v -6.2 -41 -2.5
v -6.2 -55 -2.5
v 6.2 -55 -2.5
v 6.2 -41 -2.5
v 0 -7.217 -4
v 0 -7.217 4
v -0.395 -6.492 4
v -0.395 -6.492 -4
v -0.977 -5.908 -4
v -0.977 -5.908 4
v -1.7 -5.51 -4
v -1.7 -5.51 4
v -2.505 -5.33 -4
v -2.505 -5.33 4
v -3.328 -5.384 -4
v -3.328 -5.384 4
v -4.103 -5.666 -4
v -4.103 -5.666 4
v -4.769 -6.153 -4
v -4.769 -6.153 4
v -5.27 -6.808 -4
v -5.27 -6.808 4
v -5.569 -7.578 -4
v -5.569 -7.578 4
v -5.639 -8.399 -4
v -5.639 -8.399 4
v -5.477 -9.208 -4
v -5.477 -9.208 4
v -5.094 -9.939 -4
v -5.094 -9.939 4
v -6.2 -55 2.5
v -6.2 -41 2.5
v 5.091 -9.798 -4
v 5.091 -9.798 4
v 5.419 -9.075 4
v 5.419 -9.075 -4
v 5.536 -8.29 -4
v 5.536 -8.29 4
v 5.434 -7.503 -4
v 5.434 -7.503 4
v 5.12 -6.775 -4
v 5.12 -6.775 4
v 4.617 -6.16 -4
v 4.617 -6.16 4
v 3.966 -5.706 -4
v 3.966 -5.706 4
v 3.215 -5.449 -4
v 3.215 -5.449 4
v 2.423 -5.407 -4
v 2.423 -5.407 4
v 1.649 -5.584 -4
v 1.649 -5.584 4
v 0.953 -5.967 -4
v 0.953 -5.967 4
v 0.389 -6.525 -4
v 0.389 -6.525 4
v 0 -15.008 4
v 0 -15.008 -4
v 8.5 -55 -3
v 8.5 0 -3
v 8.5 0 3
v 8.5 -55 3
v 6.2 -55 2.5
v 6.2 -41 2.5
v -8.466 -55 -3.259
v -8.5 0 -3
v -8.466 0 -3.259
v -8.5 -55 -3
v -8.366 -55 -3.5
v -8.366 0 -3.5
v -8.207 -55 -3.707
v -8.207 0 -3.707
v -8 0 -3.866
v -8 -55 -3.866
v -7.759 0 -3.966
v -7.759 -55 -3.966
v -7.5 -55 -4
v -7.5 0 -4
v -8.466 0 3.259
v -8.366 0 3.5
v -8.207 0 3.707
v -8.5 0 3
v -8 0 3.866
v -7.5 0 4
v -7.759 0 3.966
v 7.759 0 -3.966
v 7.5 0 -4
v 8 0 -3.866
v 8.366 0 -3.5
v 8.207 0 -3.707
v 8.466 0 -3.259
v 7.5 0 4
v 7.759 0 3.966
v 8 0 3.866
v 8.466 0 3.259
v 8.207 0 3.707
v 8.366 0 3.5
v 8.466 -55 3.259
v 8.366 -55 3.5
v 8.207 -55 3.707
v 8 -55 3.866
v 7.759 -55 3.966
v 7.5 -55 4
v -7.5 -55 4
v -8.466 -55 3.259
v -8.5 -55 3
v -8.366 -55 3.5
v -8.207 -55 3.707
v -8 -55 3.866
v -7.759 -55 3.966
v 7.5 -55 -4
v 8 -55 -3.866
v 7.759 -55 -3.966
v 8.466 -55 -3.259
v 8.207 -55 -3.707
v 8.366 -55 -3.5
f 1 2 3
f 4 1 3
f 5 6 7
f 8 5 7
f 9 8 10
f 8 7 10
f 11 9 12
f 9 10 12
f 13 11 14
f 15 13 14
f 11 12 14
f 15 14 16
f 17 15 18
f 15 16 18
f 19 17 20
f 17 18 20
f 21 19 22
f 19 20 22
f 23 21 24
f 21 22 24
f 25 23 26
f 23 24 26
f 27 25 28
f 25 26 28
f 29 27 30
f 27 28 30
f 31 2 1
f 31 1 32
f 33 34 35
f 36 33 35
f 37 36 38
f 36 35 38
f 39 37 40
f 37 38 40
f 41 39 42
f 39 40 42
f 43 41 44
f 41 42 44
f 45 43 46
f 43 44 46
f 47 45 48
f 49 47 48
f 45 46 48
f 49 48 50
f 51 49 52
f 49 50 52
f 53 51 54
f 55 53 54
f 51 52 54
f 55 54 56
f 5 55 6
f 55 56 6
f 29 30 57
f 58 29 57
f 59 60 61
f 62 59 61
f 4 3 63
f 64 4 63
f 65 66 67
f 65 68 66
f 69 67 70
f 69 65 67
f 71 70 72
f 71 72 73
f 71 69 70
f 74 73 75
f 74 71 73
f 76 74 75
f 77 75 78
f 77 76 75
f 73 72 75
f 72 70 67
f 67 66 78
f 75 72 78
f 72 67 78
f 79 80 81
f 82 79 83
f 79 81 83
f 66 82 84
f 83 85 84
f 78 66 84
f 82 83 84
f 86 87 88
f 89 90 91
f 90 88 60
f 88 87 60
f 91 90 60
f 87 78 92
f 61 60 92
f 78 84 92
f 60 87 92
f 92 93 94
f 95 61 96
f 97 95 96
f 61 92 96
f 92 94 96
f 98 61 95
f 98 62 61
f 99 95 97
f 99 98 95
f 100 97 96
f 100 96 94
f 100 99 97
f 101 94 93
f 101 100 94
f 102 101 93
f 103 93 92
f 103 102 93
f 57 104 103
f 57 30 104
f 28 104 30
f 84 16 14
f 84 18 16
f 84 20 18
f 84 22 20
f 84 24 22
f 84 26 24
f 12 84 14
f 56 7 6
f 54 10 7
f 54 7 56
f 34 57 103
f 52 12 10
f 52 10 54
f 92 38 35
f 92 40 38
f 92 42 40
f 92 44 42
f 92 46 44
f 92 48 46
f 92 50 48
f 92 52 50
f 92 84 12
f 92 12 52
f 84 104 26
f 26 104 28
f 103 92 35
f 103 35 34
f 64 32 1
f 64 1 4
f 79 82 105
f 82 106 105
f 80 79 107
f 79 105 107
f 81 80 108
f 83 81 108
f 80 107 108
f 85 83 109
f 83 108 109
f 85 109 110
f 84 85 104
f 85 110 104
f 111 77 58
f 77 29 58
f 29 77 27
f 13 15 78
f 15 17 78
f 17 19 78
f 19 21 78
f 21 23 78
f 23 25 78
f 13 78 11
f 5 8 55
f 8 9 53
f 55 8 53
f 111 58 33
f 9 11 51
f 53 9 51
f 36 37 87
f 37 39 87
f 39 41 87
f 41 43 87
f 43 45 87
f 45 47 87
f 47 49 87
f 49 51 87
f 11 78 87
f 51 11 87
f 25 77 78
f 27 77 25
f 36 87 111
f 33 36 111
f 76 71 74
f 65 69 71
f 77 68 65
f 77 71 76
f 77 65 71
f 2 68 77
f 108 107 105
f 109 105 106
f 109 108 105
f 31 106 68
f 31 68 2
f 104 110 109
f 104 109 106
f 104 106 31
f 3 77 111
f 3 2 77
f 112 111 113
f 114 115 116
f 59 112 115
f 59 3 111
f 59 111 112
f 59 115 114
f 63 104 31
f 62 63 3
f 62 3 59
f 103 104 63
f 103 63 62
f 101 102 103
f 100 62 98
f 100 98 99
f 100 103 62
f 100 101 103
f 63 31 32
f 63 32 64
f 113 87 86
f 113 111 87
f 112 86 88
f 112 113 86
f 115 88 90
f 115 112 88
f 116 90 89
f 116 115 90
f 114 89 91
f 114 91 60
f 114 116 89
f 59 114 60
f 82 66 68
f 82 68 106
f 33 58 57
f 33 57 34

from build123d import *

# Parameters (mm, degrees)
F0_W     = 17
F0_H     = 8
F1_DEPTH = 55
F2_R     = 1
F3_W     = 12.4
F3_H     = 5
F4_DEPTH = 14
F6_DEPTH = 25


with BuildPart() as f1:
    # F0 (on Front) → F1 (new body)
    with BuildSketch(Plane.XZ):
        Rectangle(F0_W, F0_H)
    extrude(amount=F1_DEPTH)

    # F2
    f2_edges = [f1.edges().sort_by_distance(p)[0] for p in [
        (-8.5, -27.5, 4),
        (-8.5, -27.5, -4),
        (8.5, -27.5, -4),
        (8.5, -27.5, 4),
    ]]
    fillet(f2_edges, radius=F2_R)

    # F3 (on face) → F4 (cut)
    with BuildSketch(Plane.XZ.offset(55)):
        Rectangle(F3_W, F3_H)
    extrude(amount=-F4_DEPTH, mode=Mode.SUBTRACT)

    # F5 (on face) → F6 (cut)
    with BuildSketch(Plane.XY.offset(4)):
        with BuildLine():
            ThreePointArc((5.091245, -9.798271), (3.965953, -5.706329), (0, -7.216787))
            ThreePointArc((0, -7.216787), (-4.103388, -5.665551), (-5.093883, -9.939079))
            Line((-5.093883, -9.939079), (0, -15.008175))
            Line((0, -15.008175), (5.091245, -9.798271))
        make_face()
    extrude(amount=-F6_DEPTH, mode=Mode.SUBTRACT)


solid = f1.part
